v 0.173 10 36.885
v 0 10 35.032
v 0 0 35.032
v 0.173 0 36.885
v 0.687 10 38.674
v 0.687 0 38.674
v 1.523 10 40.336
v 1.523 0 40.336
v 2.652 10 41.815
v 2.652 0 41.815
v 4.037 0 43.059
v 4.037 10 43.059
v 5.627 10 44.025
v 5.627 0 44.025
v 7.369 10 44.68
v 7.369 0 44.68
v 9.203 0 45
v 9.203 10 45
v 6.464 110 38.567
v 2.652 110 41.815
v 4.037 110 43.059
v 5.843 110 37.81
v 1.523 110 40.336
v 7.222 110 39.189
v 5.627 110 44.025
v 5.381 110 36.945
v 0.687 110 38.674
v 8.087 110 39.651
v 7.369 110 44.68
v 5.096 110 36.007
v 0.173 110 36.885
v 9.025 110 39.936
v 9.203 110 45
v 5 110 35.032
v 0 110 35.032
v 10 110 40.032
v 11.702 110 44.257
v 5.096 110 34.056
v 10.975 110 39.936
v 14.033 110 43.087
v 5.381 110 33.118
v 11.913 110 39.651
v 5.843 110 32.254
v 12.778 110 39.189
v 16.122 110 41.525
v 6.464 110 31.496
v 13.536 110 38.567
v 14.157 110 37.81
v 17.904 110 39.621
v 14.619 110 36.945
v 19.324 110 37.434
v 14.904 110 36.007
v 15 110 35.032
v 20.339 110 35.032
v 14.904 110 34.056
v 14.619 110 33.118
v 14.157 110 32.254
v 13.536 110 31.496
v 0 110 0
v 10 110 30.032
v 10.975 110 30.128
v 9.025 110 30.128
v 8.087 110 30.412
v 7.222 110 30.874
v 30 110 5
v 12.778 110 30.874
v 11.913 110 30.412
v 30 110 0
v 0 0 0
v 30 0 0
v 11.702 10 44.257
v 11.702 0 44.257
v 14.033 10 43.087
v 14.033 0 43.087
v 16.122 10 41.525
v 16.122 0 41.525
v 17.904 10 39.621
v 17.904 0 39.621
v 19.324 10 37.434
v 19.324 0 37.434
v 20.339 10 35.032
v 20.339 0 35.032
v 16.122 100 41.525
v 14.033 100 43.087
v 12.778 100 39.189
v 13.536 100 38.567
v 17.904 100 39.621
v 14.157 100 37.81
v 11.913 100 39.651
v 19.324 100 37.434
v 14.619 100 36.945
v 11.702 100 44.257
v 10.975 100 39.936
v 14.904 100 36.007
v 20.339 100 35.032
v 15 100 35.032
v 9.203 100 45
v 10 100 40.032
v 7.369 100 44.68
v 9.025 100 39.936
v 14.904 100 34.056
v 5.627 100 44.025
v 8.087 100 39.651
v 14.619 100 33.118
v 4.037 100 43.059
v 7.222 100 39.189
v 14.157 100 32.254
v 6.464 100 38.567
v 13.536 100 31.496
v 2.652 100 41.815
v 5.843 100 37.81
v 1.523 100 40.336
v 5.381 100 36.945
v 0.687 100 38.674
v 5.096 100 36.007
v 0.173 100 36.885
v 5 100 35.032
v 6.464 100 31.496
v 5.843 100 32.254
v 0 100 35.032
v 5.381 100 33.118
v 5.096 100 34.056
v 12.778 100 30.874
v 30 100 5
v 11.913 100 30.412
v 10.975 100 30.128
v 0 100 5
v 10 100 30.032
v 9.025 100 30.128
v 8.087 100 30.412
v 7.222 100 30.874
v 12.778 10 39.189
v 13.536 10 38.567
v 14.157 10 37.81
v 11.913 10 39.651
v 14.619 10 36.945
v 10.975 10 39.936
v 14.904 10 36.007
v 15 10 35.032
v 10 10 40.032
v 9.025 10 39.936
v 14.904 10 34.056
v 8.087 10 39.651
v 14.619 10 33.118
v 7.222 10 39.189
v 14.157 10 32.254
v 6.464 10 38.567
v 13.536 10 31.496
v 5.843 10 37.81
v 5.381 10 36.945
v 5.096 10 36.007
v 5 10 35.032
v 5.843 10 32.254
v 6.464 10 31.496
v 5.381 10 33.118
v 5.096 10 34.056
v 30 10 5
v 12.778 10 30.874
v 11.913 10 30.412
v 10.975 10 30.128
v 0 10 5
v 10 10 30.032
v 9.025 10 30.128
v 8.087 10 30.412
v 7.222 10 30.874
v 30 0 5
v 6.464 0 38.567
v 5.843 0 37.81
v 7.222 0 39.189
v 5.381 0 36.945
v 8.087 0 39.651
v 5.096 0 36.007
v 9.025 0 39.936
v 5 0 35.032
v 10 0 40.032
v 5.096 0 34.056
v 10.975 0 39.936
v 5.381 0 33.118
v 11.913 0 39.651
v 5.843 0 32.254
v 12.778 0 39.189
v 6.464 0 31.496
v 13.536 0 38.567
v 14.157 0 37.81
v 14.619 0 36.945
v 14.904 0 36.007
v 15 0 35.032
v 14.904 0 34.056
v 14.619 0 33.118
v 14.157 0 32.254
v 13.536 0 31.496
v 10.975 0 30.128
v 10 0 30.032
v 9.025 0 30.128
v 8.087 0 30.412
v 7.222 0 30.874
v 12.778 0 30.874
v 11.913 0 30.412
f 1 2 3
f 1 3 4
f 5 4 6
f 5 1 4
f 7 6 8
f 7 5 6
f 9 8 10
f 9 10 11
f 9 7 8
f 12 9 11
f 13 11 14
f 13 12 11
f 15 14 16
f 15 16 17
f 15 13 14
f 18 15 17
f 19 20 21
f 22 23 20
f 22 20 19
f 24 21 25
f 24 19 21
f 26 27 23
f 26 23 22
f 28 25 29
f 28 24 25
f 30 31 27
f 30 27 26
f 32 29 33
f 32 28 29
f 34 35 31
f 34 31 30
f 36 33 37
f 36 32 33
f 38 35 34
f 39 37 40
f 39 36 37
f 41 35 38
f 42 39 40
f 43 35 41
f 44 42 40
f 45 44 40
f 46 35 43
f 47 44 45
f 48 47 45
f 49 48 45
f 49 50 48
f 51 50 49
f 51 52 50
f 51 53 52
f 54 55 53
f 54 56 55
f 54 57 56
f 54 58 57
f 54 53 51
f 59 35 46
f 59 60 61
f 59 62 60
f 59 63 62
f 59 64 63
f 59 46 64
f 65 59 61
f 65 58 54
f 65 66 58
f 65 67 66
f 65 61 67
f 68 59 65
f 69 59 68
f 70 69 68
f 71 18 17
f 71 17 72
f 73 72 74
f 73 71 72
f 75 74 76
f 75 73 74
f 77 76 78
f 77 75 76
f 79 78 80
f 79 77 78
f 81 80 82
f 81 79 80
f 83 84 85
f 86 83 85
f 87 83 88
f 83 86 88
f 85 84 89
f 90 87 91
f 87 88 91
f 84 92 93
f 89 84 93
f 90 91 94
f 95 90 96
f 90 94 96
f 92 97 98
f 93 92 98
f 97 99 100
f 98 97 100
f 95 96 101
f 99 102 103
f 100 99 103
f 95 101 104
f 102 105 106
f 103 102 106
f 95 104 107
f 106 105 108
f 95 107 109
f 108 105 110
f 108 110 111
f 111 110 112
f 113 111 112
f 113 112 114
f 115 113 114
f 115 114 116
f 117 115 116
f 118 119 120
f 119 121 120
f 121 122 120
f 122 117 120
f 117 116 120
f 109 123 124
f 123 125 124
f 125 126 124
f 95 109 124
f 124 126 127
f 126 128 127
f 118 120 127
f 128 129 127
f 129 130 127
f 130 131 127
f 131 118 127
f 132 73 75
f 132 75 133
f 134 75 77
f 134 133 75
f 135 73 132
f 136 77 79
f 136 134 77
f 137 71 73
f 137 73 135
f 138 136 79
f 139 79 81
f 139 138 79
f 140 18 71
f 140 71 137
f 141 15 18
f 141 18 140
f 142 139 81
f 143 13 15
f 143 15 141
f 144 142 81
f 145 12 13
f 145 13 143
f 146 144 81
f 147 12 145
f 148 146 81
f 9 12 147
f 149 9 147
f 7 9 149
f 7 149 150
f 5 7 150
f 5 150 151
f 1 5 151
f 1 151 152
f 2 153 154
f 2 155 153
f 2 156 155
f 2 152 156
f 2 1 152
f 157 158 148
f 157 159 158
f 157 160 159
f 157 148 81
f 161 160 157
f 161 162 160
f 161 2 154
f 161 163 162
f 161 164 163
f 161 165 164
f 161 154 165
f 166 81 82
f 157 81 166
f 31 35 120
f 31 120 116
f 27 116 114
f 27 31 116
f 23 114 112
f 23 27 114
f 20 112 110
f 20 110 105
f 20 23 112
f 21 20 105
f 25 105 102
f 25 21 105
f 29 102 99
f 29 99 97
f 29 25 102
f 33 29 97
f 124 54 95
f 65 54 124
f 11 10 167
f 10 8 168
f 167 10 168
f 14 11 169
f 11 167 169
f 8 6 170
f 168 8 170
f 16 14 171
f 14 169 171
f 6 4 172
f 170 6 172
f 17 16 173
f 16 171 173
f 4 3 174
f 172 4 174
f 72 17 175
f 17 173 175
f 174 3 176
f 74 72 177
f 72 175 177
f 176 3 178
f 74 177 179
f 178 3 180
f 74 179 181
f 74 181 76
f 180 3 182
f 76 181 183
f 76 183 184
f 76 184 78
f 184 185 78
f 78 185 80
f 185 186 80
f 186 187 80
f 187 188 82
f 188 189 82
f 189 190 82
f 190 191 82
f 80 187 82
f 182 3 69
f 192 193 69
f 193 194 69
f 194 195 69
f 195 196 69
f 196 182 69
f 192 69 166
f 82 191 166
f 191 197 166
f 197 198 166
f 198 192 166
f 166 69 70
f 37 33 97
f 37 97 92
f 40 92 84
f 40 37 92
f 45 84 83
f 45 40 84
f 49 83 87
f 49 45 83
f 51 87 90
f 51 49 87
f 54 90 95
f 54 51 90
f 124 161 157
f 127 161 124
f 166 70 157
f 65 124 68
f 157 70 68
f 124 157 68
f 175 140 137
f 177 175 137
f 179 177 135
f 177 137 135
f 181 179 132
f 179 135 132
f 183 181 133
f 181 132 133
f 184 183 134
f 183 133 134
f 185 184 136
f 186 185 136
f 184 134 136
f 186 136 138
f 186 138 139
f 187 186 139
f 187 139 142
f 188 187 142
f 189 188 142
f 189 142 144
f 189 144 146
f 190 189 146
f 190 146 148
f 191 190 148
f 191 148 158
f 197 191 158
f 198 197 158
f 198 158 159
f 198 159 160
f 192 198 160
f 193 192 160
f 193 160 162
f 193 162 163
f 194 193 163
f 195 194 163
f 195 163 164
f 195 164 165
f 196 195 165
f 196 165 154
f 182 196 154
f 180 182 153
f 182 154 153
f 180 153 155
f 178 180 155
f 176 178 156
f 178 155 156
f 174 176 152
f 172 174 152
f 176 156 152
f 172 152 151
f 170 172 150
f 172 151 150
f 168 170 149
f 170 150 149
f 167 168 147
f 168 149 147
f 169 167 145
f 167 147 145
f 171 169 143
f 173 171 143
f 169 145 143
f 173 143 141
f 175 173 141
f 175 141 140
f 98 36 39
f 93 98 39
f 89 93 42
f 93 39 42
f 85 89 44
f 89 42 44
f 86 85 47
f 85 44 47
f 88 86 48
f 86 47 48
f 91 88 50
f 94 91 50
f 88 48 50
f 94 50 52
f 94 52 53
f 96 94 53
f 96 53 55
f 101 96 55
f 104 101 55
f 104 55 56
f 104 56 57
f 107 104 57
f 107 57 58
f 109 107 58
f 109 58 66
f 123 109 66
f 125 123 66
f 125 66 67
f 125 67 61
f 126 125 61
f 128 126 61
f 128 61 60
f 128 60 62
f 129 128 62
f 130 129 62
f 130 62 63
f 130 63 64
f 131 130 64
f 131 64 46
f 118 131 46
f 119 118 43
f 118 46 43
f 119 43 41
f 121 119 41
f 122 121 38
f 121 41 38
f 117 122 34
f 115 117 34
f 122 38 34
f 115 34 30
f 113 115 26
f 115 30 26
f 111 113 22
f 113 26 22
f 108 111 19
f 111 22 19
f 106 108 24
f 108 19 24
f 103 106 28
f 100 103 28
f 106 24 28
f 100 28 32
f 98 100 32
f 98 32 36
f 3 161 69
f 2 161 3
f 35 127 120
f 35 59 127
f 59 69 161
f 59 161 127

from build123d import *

# Parameters (mm, degrees)
SKETCH1_W               = 30
SKETCH1_H               = 110
BOSS_EXTRUDE1_DEPTH     = 5
SKETCH3_R               = 5
BOSS_EXTRUDE3_DEPTH     = 110
CUT_EXTRUDE3_DEPTH      = 123.576506721
CUT_EXTRUDE3_DEPTH_BACK = 123.576506721
SKETCH5_W               = 40
SKETCH5_H               = 90


with BuildPart() as part:
    # Sketch1 → Boss-Extrude1 (new body)
    with BuildSketch(Plane.XY):
        with Locations((15, 55)):
            Rectangle(SKETCH1_W, SKETCH1_H)
    extrude(amount=BOSS_EXTRUDE1_DEPTH)

    # Sketch3 → Boss-Extrude3 (add, through all)
    with BuildSketch(Plane(origin=(0, 110, 0), x_dir=(1, 0, 0), z_dir=(0, 1, 0))):
        with BuildLine():
            Line((0, -5), (0, -35.031831765))
            ThreePointArc((0, -35.031831765), (2.65246331, -41.815171989), (9.202740917, -45))
            ThreePointArc((9.202740917, -45), (16.121762832, -41.525252064), (20.338661017, -35.031831765))
            Line((20.338661017, -35.031831765), (30, -5))
            Line((30, -5), (0, -5))
        make_face()
        with Locations(Location((10, -35.031831765, 0), (0, 0, 270))):
            Circle(SKETCH3_R, mode=Mode.SUBTRACT)
    extrude(amount=-BOSS_EXTRUDE3_DEPTH)

    # Sketch5 → Cut-Extrude3 (cut, two sides: drawn at the far end of the back side and taken through both)
    with BuildSketch(Plane(origin=(0, 0, 0), x_dir=(0, 0, -1), z_dir=(1, 0, 0)).offset(-CUT_EXTRUDE3_DEPTH_BACK)):
        with Locations((-25, 55)):
            Rectangle(SKETCH5_W, SKETCH5_H)
    extrude(amount=CUT_EXTRUDE3_DEPTH + CUT_EXTRUDE3_DEPTH_BACK, mode=Mode.SUBTRACT)


solid = part.part
